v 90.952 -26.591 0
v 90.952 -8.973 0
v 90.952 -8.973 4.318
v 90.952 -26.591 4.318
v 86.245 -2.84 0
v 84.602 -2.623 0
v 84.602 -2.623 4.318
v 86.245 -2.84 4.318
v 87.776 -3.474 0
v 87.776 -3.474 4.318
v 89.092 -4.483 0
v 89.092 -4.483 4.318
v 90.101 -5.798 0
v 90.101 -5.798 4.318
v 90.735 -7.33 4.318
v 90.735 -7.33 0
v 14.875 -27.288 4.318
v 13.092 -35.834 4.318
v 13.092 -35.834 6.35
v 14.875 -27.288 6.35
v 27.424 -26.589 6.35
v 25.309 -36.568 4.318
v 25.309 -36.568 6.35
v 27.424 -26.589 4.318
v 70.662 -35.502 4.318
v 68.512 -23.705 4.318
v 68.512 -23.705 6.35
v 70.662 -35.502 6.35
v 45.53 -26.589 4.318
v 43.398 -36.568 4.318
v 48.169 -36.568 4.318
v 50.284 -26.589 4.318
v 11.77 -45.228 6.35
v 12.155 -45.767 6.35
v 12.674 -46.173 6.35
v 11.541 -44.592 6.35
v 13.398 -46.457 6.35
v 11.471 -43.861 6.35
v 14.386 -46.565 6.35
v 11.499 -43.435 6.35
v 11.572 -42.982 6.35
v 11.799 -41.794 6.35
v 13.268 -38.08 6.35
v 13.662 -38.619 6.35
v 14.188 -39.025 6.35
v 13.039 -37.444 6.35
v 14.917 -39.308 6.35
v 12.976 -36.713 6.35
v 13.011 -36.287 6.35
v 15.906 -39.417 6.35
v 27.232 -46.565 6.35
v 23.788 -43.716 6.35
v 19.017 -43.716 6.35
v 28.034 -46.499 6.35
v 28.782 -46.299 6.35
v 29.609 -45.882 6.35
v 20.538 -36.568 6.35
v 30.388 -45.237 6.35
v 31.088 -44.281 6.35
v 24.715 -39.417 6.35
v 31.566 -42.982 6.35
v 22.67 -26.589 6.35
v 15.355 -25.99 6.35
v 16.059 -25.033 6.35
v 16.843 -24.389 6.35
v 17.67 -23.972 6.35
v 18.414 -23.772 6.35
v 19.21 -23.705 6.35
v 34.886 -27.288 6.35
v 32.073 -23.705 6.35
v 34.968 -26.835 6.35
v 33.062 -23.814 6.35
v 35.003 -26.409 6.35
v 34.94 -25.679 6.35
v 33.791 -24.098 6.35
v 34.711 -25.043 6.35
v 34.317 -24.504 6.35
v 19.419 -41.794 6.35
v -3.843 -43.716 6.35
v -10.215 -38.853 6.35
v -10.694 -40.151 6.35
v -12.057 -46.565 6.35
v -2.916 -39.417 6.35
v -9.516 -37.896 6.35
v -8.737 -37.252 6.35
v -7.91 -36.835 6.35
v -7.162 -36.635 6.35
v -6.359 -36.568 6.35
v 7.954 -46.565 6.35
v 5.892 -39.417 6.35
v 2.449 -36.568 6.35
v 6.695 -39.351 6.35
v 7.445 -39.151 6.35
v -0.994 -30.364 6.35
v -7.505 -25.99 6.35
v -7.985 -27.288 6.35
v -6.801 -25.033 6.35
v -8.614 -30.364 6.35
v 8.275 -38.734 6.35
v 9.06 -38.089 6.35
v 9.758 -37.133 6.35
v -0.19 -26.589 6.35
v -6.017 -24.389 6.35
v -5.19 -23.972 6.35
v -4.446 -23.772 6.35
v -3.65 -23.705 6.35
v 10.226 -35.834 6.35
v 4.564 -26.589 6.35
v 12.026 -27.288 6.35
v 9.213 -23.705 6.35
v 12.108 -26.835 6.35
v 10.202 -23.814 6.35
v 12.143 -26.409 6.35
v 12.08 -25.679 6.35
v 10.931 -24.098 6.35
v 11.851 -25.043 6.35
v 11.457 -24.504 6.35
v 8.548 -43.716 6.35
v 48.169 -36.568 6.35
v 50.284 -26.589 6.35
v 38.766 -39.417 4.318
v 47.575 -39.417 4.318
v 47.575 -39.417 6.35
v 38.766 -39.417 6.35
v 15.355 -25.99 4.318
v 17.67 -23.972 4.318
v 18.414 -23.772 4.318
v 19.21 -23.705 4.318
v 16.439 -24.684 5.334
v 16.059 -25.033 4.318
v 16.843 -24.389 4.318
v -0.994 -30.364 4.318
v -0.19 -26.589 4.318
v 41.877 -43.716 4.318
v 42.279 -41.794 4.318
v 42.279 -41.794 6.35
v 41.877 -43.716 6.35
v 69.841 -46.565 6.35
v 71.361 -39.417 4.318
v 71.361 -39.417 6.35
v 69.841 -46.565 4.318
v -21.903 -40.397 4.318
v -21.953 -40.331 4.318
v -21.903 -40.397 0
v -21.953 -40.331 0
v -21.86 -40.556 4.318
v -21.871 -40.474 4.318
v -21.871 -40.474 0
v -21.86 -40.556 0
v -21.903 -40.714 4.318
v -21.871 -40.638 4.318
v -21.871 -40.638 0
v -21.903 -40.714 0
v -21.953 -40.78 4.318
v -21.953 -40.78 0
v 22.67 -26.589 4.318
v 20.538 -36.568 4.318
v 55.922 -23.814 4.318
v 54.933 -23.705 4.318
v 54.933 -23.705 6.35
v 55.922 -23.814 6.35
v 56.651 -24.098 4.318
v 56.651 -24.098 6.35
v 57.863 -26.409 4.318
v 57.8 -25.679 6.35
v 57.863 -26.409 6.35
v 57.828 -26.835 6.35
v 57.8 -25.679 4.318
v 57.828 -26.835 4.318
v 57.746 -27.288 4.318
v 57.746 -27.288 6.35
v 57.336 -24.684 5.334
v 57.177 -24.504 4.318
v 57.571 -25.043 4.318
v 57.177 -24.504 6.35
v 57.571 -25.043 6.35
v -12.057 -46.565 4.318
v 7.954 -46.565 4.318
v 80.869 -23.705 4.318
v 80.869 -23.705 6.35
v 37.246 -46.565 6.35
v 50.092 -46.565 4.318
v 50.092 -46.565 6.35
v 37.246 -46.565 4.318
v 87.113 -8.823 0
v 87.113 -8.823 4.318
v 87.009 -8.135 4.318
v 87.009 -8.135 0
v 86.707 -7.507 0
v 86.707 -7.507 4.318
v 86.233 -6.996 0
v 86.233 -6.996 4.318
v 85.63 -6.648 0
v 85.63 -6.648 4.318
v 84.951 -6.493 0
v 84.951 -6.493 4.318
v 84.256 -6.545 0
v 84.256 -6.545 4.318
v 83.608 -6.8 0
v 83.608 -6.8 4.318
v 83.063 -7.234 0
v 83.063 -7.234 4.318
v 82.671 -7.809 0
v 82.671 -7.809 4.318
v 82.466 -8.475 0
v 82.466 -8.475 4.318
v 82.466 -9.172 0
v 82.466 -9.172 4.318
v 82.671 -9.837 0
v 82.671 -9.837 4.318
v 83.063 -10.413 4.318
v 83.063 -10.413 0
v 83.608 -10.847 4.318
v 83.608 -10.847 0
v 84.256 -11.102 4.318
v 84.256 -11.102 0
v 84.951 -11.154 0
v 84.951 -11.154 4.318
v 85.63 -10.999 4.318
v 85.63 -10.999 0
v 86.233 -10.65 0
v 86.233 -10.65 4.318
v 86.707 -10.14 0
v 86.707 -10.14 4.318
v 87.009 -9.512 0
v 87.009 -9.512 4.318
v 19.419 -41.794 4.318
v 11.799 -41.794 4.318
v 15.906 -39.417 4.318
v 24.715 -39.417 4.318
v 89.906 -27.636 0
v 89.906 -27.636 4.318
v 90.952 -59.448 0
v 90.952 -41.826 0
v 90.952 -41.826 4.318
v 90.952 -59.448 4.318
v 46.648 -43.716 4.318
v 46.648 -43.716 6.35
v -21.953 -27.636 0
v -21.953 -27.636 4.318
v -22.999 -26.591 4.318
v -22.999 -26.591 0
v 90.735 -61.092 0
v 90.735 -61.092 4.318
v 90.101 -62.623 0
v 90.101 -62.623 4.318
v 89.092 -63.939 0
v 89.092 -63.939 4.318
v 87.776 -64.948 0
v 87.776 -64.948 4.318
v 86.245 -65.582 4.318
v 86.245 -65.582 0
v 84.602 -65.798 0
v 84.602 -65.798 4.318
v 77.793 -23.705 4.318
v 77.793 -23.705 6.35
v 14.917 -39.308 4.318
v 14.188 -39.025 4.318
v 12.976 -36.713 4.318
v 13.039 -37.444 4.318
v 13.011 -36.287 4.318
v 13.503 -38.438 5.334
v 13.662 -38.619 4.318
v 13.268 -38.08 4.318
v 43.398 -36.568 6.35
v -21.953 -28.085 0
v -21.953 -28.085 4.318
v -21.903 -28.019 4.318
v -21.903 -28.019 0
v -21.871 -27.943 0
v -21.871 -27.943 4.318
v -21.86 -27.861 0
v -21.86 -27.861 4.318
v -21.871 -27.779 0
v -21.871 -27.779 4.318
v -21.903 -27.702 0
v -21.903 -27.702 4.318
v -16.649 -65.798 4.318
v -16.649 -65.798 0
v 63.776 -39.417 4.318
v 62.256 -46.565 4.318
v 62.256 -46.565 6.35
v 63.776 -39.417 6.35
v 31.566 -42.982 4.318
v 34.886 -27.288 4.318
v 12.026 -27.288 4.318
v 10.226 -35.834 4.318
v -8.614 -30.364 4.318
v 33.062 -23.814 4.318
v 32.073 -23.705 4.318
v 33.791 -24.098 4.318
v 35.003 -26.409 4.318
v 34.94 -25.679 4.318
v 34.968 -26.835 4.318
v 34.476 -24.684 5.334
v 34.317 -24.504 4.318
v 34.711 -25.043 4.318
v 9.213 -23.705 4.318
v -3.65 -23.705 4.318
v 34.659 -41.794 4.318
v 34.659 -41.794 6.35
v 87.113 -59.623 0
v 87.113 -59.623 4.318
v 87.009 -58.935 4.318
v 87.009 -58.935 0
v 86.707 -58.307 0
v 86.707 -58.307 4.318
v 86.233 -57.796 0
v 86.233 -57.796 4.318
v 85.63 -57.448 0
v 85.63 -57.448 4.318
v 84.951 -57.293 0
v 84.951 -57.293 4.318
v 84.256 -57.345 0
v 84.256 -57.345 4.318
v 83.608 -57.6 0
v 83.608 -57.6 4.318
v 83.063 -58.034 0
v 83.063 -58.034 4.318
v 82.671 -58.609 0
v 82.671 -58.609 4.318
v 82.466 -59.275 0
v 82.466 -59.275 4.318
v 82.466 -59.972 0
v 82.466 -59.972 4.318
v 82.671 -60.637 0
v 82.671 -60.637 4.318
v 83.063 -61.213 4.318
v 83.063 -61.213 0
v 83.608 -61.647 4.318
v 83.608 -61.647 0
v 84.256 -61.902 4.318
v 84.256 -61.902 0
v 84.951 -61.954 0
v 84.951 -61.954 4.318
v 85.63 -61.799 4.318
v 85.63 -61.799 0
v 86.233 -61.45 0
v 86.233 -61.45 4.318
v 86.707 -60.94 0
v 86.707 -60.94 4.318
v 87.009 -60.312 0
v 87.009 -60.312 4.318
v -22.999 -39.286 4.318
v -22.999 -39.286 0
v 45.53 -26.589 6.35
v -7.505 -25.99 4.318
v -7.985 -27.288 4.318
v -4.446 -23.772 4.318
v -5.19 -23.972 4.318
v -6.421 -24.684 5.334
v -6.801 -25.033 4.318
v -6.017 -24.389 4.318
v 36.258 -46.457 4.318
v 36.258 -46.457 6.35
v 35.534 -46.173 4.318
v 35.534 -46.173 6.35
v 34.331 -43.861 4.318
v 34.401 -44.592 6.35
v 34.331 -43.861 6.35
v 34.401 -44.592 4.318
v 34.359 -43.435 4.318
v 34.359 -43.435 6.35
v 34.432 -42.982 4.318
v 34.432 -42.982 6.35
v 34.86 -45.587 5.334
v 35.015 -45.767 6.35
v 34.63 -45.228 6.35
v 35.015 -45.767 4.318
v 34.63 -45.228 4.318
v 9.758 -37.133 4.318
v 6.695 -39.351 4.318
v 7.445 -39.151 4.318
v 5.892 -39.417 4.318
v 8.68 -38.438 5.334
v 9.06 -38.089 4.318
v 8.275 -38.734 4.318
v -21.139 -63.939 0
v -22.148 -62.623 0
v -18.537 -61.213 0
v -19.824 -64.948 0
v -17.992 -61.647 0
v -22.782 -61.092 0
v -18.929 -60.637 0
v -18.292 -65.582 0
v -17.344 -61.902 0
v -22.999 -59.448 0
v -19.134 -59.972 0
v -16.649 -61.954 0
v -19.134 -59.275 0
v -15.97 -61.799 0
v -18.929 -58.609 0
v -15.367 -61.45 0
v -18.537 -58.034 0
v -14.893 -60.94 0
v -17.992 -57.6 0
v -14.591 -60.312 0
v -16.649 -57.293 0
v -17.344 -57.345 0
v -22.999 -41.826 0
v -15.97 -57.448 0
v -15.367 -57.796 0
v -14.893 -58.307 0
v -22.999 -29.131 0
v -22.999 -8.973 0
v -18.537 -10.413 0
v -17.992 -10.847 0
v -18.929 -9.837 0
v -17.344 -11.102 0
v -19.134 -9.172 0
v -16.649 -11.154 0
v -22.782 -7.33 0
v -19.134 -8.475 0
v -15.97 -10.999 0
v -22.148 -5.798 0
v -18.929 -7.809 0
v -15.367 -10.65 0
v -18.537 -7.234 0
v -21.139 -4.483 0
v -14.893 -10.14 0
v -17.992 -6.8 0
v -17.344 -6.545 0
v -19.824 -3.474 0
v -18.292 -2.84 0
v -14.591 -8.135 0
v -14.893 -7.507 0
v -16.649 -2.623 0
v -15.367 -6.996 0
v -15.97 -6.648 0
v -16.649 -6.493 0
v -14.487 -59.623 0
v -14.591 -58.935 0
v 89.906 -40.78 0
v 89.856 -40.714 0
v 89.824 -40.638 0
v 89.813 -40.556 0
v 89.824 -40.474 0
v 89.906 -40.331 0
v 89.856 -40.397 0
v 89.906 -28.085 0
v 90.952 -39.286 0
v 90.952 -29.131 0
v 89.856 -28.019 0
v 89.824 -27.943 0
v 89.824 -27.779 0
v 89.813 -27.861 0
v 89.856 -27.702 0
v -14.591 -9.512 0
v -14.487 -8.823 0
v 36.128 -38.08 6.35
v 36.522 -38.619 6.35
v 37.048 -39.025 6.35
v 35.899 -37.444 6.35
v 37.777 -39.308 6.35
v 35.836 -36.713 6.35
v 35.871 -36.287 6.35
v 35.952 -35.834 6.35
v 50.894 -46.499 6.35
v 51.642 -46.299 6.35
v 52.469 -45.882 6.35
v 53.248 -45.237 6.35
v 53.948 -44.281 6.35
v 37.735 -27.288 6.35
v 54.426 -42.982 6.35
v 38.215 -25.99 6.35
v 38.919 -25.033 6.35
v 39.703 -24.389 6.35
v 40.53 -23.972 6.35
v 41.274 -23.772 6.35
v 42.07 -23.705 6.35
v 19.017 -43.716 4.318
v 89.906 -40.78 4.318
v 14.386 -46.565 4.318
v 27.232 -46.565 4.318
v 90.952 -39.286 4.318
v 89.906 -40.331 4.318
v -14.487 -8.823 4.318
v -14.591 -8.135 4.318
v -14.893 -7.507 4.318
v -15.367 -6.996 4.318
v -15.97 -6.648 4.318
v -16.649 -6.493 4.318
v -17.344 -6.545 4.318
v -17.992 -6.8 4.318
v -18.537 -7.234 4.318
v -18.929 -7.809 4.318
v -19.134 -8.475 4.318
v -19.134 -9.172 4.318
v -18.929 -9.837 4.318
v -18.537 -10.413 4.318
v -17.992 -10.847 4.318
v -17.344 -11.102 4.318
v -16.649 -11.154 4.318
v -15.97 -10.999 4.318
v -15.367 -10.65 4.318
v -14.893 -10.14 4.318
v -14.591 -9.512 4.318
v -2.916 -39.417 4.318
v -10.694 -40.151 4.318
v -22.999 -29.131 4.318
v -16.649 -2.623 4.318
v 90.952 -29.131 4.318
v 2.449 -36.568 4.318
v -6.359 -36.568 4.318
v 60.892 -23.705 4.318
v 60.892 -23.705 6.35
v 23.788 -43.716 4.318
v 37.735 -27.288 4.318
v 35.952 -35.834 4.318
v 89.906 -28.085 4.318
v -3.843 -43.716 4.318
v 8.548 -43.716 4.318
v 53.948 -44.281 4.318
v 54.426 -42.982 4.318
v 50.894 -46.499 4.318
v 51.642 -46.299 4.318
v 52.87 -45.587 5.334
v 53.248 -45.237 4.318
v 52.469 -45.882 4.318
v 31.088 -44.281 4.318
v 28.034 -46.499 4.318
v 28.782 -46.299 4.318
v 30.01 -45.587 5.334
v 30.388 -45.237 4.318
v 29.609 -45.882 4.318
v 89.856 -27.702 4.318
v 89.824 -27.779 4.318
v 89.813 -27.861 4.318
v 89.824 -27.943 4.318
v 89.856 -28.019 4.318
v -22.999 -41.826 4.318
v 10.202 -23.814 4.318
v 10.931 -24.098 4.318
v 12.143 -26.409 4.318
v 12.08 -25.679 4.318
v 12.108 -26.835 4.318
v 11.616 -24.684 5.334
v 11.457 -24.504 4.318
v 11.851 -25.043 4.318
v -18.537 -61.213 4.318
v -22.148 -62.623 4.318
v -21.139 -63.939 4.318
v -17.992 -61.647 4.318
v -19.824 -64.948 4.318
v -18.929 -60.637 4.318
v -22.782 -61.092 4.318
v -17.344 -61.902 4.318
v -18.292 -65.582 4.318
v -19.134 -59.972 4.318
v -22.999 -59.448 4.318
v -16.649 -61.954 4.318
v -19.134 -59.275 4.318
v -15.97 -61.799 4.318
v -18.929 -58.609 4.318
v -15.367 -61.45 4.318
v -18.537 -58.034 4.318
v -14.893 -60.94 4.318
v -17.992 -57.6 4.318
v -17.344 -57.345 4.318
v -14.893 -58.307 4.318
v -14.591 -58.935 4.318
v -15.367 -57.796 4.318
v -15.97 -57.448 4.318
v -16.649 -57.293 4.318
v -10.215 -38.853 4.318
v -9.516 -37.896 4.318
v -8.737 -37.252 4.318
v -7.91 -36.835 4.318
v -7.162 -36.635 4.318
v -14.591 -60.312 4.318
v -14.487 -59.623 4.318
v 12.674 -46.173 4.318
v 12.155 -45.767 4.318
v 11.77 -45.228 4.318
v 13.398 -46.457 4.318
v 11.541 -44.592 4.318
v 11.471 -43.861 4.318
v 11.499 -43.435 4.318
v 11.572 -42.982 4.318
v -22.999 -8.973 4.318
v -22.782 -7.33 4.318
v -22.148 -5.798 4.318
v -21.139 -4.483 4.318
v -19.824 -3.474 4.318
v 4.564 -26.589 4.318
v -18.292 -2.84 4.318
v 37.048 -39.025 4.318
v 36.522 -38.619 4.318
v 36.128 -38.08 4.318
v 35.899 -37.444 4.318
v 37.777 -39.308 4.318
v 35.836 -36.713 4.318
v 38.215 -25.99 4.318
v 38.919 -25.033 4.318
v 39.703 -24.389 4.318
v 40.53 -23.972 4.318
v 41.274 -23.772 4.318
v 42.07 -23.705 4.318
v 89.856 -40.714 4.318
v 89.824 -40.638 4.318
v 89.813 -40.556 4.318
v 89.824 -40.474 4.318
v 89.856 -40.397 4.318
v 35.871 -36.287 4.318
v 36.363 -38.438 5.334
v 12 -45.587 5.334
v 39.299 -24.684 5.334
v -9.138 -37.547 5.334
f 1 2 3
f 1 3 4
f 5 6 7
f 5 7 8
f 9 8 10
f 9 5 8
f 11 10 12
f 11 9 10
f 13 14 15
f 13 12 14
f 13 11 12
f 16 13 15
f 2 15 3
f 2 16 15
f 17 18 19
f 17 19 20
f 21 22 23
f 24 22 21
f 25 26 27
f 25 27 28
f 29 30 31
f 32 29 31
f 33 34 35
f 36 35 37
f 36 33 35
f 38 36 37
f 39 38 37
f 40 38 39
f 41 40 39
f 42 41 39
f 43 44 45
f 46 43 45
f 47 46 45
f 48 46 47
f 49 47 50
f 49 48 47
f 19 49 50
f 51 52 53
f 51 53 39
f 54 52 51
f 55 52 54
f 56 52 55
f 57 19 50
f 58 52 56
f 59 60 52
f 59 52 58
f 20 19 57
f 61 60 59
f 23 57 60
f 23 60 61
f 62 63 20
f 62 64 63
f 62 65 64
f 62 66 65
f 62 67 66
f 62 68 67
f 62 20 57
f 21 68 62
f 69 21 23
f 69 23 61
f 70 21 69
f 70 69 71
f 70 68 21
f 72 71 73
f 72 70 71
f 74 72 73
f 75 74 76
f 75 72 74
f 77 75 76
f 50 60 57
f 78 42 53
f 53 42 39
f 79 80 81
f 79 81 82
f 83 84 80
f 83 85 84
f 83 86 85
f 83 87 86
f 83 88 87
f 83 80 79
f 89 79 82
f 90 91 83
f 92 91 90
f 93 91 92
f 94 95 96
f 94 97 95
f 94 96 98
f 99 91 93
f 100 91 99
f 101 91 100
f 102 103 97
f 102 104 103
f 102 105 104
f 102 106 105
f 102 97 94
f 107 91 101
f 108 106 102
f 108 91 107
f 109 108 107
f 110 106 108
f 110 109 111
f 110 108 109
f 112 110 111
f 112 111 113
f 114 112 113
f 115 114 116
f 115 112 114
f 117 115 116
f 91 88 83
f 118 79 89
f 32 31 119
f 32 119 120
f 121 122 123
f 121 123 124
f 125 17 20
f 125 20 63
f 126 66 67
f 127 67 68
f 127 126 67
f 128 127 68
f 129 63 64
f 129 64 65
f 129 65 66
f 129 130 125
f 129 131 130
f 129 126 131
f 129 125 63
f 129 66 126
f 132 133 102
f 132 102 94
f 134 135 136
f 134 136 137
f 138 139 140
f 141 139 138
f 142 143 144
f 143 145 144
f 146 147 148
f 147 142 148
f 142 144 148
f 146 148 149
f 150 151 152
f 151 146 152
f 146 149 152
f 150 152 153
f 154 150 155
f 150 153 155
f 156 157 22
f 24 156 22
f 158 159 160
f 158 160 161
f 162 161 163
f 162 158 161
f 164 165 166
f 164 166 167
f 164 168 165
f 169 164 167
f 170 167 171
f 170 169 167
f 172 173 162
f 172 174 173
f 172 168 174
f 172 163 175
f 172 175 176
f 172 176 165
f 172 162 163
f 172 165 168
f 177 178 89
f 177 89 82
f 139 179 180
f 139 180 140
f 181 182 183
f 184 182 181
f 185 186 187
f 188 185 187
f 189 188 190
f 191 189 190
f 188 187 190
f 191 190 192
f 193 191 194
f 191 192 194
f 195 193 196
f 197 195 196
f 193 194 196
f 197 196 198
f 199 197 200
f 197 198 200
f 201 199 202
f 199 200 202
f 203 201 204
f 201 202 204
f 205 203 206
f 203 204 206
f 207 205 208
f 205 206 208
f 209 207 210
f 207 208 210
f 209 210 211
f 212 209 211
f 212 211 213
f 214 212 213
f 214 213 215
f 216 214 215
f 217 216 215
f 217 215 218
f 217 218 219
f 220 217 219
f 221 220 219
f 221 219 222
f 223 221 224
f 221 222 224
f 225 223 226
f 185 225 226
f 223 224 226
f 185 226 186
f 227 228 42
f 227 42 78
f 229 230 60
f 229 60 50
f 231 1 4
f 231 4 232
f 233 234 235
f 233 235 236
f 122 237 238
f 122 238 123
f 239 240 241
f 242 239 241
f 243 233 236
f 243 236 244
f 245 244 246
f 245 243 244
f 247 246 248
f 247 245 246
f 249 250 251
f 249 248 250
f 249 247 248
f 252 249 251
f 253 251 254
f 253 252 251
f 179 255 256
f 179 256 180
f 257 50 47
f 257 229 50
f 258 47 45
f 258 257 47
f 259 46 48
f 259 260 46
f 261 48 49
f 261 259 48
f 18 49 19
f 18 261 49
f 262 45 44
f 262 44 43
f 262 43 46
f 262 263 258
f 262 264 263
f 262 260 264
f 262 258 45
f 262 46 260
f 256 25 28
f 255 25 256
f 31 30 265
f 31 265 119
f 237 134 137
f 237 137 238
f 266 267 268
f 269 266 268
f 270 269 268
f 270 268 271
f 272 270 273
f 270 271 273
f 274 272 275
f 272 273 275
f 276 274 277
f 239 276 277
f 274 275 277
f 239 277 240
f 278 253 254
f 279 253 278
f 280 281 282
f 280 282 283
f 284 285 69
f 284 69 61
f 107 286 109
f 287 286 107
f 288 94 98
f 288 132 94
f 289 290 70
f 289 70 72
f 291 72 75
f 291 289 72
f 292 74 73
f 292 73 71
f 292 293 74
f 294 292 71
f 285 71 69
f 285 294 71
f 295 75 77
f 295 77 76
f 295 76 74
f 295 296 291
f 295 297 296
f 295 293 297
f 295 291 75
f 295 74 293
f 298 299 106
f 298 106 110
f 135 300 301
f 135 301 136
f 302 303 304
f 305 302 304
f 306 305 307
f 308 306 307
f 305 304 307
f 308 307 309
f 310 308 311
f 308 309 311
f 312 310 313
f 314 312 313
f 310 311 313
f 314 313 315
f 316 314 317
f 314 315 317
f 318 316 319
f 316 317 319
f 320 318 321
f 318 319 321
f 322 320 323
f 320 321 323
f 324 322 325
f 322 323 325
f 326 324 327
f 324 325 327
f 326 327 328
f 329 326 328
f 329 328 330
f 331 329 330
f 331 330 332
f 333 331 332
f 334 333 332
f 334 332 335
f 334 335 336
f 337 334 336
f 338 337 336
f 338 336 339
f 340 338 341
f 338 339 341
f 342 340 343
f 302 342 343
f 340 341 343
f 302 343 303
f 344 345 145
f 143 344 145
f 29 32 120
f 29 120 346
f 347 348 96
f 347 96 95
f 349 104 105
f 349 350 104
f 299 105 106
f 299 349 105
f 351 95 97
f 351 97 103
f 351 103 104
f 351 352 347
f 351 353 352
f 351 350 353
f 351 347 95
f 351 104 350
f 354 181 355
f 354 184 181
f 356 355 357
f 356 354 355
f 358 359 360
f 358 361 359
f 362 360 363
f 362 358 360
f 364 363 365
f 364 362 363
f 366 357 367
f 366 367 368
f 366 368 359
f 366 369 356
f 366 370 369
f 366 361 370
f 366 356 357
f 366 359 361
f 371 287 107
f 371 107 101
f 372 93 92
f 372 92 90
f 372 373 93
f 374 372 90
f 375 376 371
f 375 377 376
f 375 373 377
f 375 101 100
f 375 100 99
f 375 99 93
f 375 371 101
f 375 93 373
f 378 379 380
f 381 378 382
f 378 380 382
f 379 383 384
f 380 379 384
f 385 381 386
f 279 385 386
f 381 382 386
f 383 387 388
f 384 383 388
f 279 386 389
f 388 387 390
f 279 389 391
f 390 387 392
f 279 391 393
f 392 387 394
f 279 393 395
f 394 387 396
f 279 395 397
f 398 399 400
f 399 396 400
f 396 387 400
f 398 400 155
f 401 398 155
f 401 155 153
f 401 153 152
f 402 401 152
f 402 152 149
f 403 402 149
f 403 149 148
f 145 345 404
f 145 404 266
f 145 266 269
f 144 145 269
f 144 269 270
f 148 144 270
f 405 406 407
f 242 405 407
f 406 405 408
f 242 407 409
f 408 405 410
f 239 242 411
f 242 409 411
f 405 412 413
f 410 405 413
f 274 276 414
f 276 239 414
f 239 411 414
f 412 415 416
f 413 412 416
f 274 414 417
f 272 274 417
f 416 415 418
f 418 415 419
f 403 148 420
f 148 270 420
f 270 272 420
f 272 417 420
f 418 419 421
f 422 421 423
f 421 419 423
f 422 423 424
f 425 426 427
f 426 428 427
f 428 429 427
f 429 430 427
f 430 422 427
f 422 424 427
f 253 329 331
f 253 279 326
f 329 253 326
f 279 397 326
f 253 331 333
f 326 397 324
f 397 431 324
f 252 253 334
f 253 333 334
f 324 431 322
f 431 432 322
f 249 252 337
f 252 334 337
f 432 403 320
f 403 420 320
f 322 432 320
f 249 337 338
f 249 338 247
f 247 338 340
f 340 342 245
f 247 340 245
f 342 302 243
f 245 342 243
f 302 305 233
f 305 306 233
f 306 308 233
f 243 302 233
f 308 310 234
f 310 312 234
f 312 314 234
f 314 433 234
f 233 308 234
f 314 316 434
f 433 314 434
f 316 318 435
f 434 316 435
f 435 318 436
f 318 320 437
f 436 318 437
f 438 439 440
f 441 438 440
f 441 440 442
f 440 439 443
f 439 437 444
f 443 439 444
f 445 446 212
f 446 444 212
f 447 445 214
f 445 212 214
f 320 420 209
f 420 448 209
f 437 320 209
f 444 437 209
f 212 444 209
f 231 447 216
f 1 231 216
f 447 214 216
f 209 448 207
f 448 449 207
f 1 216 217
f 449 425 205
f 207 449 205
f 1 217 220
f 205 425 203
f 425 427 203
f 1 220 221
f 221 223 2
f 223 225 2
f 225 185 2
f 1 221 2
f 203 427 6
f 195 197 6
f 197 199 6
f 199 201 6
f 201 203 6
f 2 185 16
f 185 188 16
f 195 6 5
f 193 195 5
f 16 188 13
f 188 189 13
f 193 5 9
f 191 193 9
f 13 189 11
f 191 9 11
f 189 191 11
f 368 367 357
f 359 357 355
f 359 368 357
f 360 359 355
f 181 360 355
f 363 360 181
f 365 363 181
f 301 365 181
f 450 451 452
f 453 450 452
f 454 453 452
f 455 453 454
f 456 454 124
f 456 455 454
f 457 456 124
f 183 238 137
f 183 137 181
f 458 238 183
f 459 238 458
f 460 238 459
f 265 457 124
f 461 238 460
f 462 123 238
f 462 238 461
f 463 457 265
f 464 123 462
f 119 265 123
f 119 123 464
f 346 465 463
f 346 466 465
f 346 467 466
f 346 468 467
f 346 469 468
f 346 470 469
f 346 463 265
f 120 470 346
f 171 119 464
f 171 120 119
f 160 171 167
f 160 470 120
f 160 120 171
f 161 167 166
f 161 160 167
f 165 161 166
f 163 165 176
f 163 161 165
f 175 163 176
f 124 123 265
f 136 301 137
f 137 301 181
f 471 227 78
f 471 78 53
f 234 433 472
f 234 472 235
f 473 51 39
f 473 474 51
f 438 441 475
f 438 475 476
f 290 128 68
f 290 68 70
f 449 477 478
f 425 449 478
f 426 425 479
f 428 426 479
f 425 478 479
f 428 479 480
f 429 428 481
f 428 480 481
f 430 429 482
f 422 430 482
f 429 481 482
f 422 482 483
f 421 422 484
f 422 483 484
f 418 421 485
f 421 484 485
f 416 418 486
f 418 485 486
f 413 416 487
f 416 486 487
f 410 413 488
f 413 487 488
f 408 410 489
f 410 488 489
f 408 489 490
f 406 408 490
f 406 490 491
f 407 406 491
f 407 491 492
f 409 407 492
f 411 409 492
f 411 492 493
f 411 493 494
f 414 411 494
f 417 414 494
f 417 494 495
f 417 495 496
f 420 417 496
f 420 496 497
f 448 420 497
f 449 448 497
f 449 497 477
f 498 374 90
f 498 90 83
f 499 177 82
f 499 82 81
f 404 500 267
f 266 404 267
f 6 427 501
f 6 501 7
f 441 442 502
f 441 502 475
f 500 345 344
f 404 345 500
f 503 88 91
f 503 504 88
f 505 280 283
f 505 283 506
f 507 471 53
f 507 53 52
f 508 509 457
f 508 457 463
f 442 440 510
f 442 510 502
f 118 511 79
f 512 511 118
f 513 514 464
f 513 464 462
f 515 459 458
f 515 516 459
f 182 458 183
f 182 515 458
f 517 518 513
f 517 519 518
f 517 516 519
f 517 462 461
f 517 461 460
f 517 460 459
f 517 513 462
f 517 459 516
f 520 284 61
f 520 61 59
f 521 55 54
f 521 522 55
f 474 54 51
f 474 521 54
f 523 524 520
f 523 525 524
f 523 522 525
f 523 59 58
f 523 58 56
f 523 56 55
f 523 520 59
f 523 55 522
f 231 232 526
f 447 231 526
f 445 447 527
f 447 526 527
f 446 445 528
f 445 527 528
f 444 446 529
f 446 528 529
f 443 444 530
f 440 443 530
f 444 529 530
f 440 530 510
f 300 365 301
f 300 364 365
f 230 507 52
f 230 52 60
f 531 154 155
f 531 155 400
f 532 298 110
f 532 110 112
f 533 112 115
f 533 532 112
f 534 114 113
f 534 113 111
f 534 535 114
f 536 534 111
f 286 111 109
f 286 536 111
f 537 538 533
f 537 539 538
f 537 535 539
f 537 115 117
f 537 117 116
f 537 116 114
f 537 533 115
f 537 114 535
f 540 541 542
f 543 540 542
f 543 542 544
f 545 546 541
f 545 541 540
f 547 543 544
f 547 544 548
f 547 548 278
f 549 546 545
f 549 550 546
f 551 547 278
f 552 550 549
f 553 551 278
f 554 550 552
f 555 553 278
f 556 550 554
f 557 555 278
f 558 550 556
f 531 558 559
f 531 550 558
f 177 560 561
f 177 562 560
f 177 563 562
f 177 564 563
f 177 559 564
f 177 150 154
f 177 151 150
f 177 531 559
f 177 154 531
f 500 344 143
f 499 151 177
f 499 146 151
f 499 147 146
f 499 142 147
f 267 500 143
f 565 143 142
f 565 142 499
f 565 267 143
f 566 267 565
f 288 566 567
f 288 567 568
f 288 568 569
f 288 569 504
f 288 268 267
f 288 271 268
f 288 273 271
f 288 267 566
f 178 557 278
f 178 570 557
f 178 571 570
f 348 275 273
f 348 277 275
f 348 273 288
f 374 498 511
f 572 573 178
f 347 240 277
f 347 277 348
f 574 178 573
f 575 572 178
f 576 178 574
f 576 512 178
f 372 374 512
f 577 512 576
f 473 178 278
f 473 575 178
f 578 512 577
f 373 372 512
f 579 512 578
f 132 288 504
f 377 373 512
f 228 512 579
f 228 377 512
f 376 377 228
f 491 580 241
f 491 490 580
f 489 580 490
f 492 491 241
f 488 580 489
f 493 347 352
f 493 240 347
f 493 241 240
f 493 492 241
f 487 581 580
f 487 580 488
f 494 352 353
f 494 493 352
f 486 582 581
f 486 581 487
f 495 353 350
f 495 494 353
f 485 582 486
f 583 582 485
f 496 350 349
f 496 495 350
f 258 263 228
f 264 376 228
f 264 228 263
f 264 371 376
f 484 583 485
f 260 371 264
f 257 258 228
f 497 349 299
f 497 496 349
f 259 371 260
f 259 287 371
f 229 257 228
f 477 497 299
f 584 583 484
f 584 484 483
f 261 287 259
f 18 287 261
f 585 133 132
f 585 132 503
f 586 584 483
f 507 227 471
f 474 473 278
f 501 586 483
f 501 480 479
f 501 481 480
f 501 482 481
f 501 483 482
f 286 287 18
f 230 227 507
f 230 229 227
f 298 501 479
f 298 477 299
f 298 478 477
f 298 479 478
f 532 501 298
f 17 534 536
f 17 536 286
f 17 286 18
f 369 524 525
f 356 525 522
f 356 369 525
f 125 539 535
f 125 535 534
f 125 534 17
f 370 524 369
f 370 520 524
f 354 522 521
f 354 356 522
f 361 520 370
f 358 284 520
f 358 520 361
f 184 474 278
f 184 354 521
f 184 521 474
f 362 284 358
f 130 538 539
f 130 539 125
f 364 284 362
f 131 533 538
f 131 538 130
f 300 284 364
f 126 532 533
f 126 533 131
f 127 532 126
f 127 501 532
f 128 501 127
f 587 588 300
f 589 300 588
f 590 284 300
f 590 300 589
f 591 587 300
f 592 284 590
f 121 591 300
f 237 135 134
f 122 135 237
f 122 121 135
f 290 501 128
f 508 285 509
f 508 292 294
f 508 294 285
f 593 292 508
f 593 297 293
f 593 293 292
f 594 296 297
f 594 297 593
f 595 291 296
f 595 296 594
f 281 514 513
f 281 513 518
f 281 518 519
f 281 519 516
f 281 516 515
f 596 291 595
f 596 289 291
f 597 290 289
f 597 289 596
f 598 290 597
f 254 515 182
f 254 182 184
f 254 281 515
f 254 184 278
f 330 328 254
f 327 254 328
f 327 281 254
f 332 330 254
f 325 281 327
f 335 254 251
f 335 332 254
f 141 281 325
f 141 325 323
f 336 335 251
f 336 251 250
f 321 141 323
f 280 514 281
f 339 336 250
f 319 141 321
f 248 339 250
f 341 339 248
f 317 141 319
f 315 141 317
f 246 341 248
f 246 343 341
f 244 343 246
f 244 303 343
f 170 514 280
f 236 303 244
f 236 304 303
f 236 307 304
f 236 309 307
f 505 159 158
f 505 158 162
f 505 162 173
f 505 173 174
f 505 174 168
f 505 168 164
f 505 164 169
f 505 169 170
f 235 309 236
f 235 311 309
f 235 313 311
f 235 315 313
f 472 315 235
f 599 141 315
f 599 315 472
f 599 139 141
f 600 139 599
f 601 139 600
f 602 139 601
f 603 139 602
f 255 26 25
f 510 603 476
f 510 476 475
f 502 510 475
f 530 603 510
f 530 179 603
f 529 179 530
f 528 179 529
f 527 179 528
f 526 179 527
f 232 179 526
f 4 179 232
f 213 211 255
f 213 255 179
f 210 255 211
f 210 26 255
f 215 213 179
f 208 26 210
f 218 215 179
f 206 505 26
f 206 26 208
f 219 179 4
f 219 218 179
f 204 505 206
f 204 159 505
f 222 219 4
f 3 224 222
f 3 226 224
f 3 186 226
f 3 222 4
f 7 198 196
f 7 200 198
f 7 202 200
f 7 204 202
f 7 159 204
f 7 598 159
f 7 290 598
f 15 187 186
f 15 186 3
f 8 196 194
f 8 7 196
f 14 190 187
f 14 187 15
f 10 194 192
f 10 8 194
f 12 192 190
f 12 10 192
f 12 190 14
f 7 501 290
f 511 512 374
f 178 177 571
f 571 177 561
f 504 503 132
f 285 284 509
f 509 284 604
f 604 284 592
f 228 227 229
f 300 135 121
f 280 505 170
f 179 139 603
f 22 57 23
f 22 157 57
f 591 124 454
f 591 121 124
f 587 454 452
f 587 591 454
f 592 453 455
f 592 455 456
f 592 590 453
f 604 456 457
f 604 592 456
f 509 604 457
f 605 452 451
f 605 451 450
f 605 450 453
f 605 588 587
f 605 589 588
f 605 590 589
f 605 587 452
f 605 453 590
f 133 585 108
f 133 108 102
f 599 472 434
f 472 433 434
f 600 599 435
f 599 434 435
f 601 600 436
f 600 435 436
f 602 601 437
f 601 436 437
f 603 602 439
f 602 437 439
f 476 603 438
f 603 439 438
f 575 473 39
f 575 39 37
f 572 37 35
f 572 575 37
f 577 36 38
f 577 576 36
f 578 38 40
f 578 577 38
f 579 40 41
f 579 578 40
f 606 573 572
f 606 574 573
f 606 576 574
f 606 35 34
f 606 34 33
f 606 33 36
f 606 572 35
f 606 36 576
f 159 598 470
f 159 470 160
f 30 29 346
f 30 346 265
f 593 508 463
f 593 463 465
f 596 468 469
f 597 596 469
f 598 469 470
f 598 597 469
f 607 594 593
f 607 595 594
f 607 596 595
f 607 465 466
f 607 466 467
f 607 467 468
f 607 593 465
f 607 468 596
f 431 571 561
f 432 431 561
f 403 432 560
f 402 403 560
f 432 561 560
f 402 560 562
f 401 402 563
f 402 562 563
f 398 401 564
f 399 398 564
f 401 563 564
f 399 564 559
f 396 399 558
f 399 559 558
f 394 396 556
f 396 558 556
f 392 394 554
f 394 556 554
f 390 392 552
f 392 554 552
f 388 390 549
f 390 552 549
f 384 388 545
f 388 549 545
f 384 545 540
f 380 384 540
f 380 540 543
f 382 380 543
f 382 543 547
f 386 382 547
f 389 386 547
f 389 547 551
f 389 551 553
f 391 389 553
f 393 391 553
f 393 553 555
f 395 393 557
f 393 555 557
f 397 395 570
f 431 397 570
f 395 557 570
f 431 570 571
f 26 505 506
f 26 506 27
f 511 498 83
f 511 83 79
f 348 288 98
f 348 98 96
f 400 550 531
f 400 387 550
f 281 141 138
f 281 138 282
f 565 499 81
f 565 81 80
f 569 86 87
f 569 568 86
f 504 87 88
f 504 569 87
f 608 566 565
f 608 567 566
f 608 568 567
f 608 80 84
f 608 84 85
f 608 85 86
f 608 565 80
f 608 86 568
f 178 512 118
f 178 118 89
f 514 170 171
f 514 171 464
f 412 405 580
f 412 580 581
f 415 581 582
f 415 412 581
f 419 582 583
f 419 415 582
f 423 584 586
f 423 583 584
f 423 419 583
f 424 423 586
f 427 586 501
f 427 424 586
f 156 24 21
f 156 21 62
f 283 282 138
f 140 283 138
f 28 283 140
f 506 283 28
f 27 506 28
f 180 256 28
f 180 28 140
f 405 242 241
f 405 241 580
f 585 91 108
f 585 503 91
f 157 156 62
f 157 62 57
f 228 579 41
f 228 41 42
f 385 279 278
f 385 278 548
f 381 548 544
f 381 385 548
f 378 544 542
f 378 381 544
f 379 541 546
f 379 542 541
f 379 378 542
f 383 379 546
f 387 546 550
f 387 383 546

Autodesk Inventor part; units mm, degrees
ref_plane "YZ Plane" through (0, 0, 0) normal (1, 0, 0) x (0, 1, 0)
ref_plane "XZ Plane" through (0, 0, 0) normal (0, 1, 0) x (-1, 0, 0)
ref_plane "XY Plane" through (0, 0, 0) normal (0, 0, 1) x (1, 0, 0)
sketch "Sketch1" plane through (0, 0, 0) normal (0, 0, 1) x (1, 0, 0)
  circle A0 centre (-16.8236, -8.8233) radius 2.1 projected
  circle A1 centre (84.7764, -8.8233) radius 2.1 projected
  circle A2 centre (84.7764, -59.6233) radius 2.1 projected
  circle A3 centre (-16.8236, -59.6233) radius 2.1 projected
  line L0 (-11.8121, -2.6233) -> (-16.8236, -2.6233) projected
  line L1 (84.7764, -65.7984) -> (79.7648, -65.7984) projected
  line L2 (90.9515, -41.9118) -> (90.9515, -51.9348) projected
  line L3 (-22.9988, -26.5348) -> (-22.9988, -16.5118) projected
  line L4 (-16.6488, -2.6233) -> (84.6015, -2.6233)
  line L5 (90.9515, -8.9733) -> (90.9515, -59.4484)
  line L6 (84.6015, -65.7984) -> (-16.6488, -65.7984)
  line L7 (-22.9988, -59.4484) -> (-22.9988, -8.9733)
  arc A4 (-16.6488, -2.6233) -> (-22.9988, -8.9733) centre (-16.6488, -8.9733) ccw
  arc A5 (-22.9988, -59.4484) -> (-16.6488, -65.7984) centre (-16.6488, -59.4484) ccw
  arc A6 (84.6015, -65.7984) -> (90.9515, -59.4484) centre (84.6015, -59.4484) ccw
  arc A7 (90.9515, -8.9733) -> (84.6015, -2.6233) centre (84.6015, -8.9733) ccw
  line L8 (-22.9988, -39.2857) -> (-21.9533, -40.3312)
  line L9 (-21.9533, -40.7802) -> (-22.9988, -41.8257)
  arc A8 (-21.9533, -40.7802) -> (-21.9533, -40.3312) centre (-22.1778, -40.5557) ccw
  line L10 (33.9764, -2.6233) -> (33.9764, -65.7984)
  line L11 (90.9515, -39.2857) -> (89.906, -40.3312)
  line L12 (89.906, -40.7802) -> (90.9515, -41.8257)
  arc A9 (89.906, -40.3312) -> (89.906, -40.7802) centre (90.1305, -40.5557) ccw
  point P0 (0, 0)
  point P1 (-22.9988, -2.6233)
  point P2 (90.9515, -65.7984)
  point P3 (90.9515, -2.6233)
  point P4 (-21.7288, -40.5557)
  dimension "d0" = 113.9502
  dimension "d1" = 63.1751
  dimension "d2" = 6.35
  dimension "d3" = 1.27
  dimension "d4" = 1.27
  dimension "d5" = 0.3175
extrude "Extrusion1" add sketch "Sketch1" along normal blind 4.318 contours L4 L10 L6 A5 L7 L9 A8 L8 L3 A4 L0 | L4 A7 L5 L11 A9 L12 L2 A6 L1 L6 L10
sketch "Sketch2" plane through (0, 0, 4.318) normal (0, 0, 1) x (1, 0, 0)
  point P0 (0, 0)
sketch "Sketch3" plane through (0, 0, 4.318) normal (0, 0, 1) x (1, 0, 0)
  line L0 (-11.0608, -23.7053) -> (-1.734, -23.7053) construction
  line L1 (-1.734, -23.7053) -> (-1.734, -28.4261) construction
  line L2 (-1.734, -28.4261) -> (-11.0608, -28.4261) construction
  line L3 (-11.0608, -28.4261) -> (-11.0608, -23.7053) construction
  line L4 (84.6015, -2.6233) -> (-16.6488, -2.6233) construction
  line L5 (33.9764, -2.6233) -> (33.9764, -66.312) construction
  line L6 (-22.9988, -8.9733) -> (-22.9988, -39.2857) construction
  line L7 (-22.9988, -34.4676) -> (90.982, -34.4676) construction
  line L8 (-3.8427, -43.7165) -> (8.5485, -43.7165)
  line L9 (8.5485, -43.7165) -> (7.9543, -46.5653)
  line L10 (7.9543, -46.5653) -> (-12.0569, -46.5653)
  line L11 (-12.0569, -46.5653) -> (-10.6937, -40.1512)
  spline S0 degree 2 poles (-10.6937, -40.1512) (-10.3267, -38.5258) (-7.9498, -36.5684) (-6.3594, -36.5684) knots 0 0 0 1 2 2 2
  line L12 (-6.3594, -36.5684) -> (2.449, -36.5684)
  line L13 (2.449, -36.5684) -> (4.5637, -26.589)
  line L14 (4.5637, -26.589) -> (-0.19, -26.589)
  line L15 (-0.19, -26.589) -> (-0.994, -30.3641)
  line L16 (-0.994, -30.3641) -> (-8.614, -30.3641)
  line L17 (-8.614, -30.3641) -> (-7.9848, -27.2881)
  spline S1 degree 2 poles (-7.9848, -27.2881) (-7.6178, -25.6627) (-5.2234, -23.7053) (-3.6505, -23.7053) knots 0 0 0 1 2 2 2
  line L18 (-3.6505, -23.7053) -> (9.2126, -23.7053)
  spline S2 degree 2 poles (9.2126, -23.7053) (10.838, -23.7053) (12.3935, -25.6627) (12.0264, -27.2881) knots 0 0 0 1 2 2 2
  line L19 (12.0264, -27.2881) -> (10.2263, -35.8344)
  spline S3 degree 2 poles (10.2263, -35.8344) (9.8768, -37.4597) (7.4824, -39.4172) (5.892, -39.4172) knots 0 0 0 1 2 2 2
  line L20 (5.892, -39.4172) -> (-2.9164, -39.4172)
  line L21 (-2.9164, -39.4172) -> (-3.8427, -43.7165)
  spline S4 degree 2 poles (14.8752, -27.2881) (15.2422, -25.6627) (17.6366, -23.7053) (19.2095, -23.7053) knots 0 0 0 1 2 2 2
  line L22 (19.2095, -23.7053) -> (32.0726, -23.7053)
  spline S5 degree 2 poles (32.0726, -23.7053) (33.698, -23.7053) (35.2535, -25.6627) (34.8864, -27.2881) knots 0 0 0 1 2 2 2
  line L23 (34.8864, -27.2881) -> (31.5658, -42.9825)
  spline S6 degree 2 poles (31.5658, -42.9825) (31.1988, -44.6079) (28.8219, -46.5653) (27.2315, -46.5653) knots 0 0 0 1 2 2 2
  line L24 (27.2315, -46.5653) -> (14.3859, -46.5653)
  spline S7 degree 2 poles (14.3859, -46.5653) (12.7605, -46.5653) (11.24, -44.6079) (11.572, -42.9825) knots 0 0 0 1 2 2 2
  line L25 (11.572, -42.9825) -> (11.7992, -41.7941)
  line L26 (11.7992, -41.7941) -> (19.4192, -41.7941)
  line L27 (19.4192, -41.7941) -> (19.0173, -43.7165)
  line L28 (19.0173, -43.7165) -> (23.7885, -43.7165)
  line L29 (23.7885, -43.7165) -> (24.7148, -39.4172)
  line L30 (24.7148, -39.4172) -> (15.9064, -39.4172)
  spline S8 degree 2 poles (15.9064, -39.4172) (14.281, -39.4172) (12.7255, -37.4597) (13.0925, -35.8344) knots 0 0 0 1 2 2 2
  line L31 (13.0925, -35.8344) -> (14.8752, -27.2881)
  line L32 (22.67, -26.589) -> (20.5378, -36.5684)
  line L33 (20.5378, -36.5684) -> (25.309, -36.5684)
  line L34 (25.309, -36.5684) -> (27.4237, -26.589)
  line L35 (27.4237, -26.589) -> (22.67, -26.589)
  spline S9 degree 2 poles (37.7352, -27.2881) (38.1022, -25.6627) (40.4966, -23.7053) (42.0695, -23.7053) knots 0 0 0 1 2 2 2
  line L36 (42.0695, -23.7053) -> (54.9326, -23.7053)
  spline S10 degree 2 poles (54.9326, -23.7053) (56.558, -23.7053) (58.1135, -25.6627) (57.7464, -27.2881) knots 0 0 0 1 2 2 2
  line L37 (57.7464, -27.2881) -> (54.4258, -42.9825)
  spline S11 degree 2 poles (54.4258, -42.9825) (54.0588, -44.6079) (51.6819, -46.5653) (50.0915, -46.5653) knots 0 0 0 1 2 2 2
  line L38 (50.0915, -46.5653) -> (37.2459, -46.5653)
  spline S12 degree 2 poles (37.2459, -46.5653) (35.6205, -46.5653) (34.1, -44.6079) (34.432, -42.9825) knots 0 0 0 1 2 2 2
  line L39 (34.432, -42.9825) -> (34.6592, -41.7941)
  line L40 (34.6592, -41.7941) -> (42.2792, -41.7941)
  line L41 (42.2792, -41.7941) -> (41.8773, -43.7165)
  line L42 (41.8773, -43.7165) -> (46.6485, -43.7165)
  line L43 (46.6485, -43.7165) -> (47.5748, -39.4172)
  line L44 (47.5748, -39.4172) -> (38.7664, -39.4172)
  spline S13 degree 2 poles (38.7664, -39.4172) (37.141, -39.4172) (35.5855, -37.4597) (35.9525, -35.8344) knots 0 0 0 1 2 2 2
  line L45 (35.9525, -35.8344) -> (37.7352, -27.2881)
  line L46 (45.53, -26.589) -> (43.3978, -36.5684)
  line L47 (43.3978, -36.5684) -> (48.169, -36.5684)
  line L48 (48.169, -36.5684) -> (50.2837, -26.589)
  line L49 (50.2837, -26.589) -> (45.53, -26.589)
  line L50 (71.3611, -39.4172) -> (69.8406, -46.5653)
  line L51 (69.8406, -46.5653) -> (62.2555, -46.5653)
  line L52 (62.2555, -46.5653) -> (63.776, -39.4172)
  line L53 (63.776, -39.4172) -> (60.8923, -23.7053)
  line L54 (60.8923, -23.7053) -> (68.5123, -23.7053)
  line L55 (68.5123, -23.7053) -> (70.662, -35.5023)
  line L56 (70.662, -35.5023) -> (77.7926, -23.7053)
  line L57 (77.7926, -23.7053) -> (80.8686, -23.7053)
  line L58 (80.8686, -23.7053) -> (71.3611, -39.4172)
  point P0 (0, 0)
  point P1 (-11.0608, -26.0657)
  dimension "d8" = 11.938
  dimension "d11" = 21.082
extrude "Extrusion3" add sketch "Sketch3" along normal blind 2.032
sketch "Sketch4" plane through (0, 0, 4.318) normal (0, 0, 1) x (1, 0, 0)
  line L0 (-22.9988, -39.2857) -> (-21.9533, -40.3312) projected
  line L1 (-21.9533, -40.7802) -> (-22.9988, -41.8257) projected
  arc A0 (-21.9533, -40.7802) -> (-21.9533, -40.3312) centre (-22.1778, -40.5557) ccw projected
  line L2 (90.9515, -41.8257) -> (89.906, -40.7802) projected
  arc A1 (89.906, -40.3312) -> (89.906, -40.7802) centre (90.1305, -40.5557) ccw projected
  line L3 (89.906, -40.3312) -> (90.9515, -39.2857) projected
  line L4 (-22.9988, -8.9733) -> (-22.9988, -39.2857) construction
  line L5 (-22.9988, -34.2082) -> (90.9515, -34.2082) construction
  line L6 (90.9515, -39.2857) -> (90.9515, -8.9733) construction
  line L7 (84.6015, -2.6233) -> (-16.6488, -2.6233) construction
  line L8 (-22.9988, -29.1307) -> (-21.9533, -28.0852)
  line L9 (-21.9533, -27.6362) -> (-22.9988, -26.5907)
  arc A2 (-21.9533, -28.0852) -> (-21.9533, -27.6362) centre (-22.1778, -27.8607) ccw
  line L10 (90.9515, -26.5907) -> (89.906, -27.6362)
  arc A3 (89.906, -27.6362) -> (89.906, -28.0852) centre (90.1305, -27.8607) ccw
  line L11 (89.906, -28.0852) -> (90.9515, -29.1307)
  line L12 (90.9515, -26.5907) -> (90.9515, -29.1307) construction
  line L13 (-22.9988, -26.5907) -> (-22.9988, -29.1307) construction
  line L14 (-22.9988, -26.5907) -> (-22.9988, -29.1307)
  line L15 (90.9515, -26.5907) -> (90.9515, -29.1307)
  point P0 (0, 0)
  dimension "d14" = 31.5849
extrude "Extrusion4" cut sketch "Sketch4" against normal through all
sketch "Sketch5" plane through (0, 0, 4.318) normal (0, 0, 1) x (1, 0, 0)
  circle A0 centre (-16.8236, -8.8233) radius 2.1 projected
  circle A1 centre (-16.8236, -8.8233) radius 2.3368
  circle A2 centre (84.7764, -8.8233) radius 2.1 projected
  circle A3 centre (84.7764, -59.6233) radius 2.1 projected
  circle A4 centre (-16.8236, -59.6233) radius 2.1 projected
  circle A5 centre (84.7764, -8.8233) radius 2.3368
  circle A6 centre (84.7764, -59.6233) radius 2.3368
  circle A7 centre (-16.8236, -59.6233) radius 2.3368
  point P0 (0, 0)
  dimension "d17" = 4.6736
  dimension "d18" = 4.6736
  dimension "d19" = 4.6736
  dimension "d20" = 4.6736
extrude "Extrusion5" cut sketch "Sketch5" against normal blind 25.4
properties part number "299Y"
